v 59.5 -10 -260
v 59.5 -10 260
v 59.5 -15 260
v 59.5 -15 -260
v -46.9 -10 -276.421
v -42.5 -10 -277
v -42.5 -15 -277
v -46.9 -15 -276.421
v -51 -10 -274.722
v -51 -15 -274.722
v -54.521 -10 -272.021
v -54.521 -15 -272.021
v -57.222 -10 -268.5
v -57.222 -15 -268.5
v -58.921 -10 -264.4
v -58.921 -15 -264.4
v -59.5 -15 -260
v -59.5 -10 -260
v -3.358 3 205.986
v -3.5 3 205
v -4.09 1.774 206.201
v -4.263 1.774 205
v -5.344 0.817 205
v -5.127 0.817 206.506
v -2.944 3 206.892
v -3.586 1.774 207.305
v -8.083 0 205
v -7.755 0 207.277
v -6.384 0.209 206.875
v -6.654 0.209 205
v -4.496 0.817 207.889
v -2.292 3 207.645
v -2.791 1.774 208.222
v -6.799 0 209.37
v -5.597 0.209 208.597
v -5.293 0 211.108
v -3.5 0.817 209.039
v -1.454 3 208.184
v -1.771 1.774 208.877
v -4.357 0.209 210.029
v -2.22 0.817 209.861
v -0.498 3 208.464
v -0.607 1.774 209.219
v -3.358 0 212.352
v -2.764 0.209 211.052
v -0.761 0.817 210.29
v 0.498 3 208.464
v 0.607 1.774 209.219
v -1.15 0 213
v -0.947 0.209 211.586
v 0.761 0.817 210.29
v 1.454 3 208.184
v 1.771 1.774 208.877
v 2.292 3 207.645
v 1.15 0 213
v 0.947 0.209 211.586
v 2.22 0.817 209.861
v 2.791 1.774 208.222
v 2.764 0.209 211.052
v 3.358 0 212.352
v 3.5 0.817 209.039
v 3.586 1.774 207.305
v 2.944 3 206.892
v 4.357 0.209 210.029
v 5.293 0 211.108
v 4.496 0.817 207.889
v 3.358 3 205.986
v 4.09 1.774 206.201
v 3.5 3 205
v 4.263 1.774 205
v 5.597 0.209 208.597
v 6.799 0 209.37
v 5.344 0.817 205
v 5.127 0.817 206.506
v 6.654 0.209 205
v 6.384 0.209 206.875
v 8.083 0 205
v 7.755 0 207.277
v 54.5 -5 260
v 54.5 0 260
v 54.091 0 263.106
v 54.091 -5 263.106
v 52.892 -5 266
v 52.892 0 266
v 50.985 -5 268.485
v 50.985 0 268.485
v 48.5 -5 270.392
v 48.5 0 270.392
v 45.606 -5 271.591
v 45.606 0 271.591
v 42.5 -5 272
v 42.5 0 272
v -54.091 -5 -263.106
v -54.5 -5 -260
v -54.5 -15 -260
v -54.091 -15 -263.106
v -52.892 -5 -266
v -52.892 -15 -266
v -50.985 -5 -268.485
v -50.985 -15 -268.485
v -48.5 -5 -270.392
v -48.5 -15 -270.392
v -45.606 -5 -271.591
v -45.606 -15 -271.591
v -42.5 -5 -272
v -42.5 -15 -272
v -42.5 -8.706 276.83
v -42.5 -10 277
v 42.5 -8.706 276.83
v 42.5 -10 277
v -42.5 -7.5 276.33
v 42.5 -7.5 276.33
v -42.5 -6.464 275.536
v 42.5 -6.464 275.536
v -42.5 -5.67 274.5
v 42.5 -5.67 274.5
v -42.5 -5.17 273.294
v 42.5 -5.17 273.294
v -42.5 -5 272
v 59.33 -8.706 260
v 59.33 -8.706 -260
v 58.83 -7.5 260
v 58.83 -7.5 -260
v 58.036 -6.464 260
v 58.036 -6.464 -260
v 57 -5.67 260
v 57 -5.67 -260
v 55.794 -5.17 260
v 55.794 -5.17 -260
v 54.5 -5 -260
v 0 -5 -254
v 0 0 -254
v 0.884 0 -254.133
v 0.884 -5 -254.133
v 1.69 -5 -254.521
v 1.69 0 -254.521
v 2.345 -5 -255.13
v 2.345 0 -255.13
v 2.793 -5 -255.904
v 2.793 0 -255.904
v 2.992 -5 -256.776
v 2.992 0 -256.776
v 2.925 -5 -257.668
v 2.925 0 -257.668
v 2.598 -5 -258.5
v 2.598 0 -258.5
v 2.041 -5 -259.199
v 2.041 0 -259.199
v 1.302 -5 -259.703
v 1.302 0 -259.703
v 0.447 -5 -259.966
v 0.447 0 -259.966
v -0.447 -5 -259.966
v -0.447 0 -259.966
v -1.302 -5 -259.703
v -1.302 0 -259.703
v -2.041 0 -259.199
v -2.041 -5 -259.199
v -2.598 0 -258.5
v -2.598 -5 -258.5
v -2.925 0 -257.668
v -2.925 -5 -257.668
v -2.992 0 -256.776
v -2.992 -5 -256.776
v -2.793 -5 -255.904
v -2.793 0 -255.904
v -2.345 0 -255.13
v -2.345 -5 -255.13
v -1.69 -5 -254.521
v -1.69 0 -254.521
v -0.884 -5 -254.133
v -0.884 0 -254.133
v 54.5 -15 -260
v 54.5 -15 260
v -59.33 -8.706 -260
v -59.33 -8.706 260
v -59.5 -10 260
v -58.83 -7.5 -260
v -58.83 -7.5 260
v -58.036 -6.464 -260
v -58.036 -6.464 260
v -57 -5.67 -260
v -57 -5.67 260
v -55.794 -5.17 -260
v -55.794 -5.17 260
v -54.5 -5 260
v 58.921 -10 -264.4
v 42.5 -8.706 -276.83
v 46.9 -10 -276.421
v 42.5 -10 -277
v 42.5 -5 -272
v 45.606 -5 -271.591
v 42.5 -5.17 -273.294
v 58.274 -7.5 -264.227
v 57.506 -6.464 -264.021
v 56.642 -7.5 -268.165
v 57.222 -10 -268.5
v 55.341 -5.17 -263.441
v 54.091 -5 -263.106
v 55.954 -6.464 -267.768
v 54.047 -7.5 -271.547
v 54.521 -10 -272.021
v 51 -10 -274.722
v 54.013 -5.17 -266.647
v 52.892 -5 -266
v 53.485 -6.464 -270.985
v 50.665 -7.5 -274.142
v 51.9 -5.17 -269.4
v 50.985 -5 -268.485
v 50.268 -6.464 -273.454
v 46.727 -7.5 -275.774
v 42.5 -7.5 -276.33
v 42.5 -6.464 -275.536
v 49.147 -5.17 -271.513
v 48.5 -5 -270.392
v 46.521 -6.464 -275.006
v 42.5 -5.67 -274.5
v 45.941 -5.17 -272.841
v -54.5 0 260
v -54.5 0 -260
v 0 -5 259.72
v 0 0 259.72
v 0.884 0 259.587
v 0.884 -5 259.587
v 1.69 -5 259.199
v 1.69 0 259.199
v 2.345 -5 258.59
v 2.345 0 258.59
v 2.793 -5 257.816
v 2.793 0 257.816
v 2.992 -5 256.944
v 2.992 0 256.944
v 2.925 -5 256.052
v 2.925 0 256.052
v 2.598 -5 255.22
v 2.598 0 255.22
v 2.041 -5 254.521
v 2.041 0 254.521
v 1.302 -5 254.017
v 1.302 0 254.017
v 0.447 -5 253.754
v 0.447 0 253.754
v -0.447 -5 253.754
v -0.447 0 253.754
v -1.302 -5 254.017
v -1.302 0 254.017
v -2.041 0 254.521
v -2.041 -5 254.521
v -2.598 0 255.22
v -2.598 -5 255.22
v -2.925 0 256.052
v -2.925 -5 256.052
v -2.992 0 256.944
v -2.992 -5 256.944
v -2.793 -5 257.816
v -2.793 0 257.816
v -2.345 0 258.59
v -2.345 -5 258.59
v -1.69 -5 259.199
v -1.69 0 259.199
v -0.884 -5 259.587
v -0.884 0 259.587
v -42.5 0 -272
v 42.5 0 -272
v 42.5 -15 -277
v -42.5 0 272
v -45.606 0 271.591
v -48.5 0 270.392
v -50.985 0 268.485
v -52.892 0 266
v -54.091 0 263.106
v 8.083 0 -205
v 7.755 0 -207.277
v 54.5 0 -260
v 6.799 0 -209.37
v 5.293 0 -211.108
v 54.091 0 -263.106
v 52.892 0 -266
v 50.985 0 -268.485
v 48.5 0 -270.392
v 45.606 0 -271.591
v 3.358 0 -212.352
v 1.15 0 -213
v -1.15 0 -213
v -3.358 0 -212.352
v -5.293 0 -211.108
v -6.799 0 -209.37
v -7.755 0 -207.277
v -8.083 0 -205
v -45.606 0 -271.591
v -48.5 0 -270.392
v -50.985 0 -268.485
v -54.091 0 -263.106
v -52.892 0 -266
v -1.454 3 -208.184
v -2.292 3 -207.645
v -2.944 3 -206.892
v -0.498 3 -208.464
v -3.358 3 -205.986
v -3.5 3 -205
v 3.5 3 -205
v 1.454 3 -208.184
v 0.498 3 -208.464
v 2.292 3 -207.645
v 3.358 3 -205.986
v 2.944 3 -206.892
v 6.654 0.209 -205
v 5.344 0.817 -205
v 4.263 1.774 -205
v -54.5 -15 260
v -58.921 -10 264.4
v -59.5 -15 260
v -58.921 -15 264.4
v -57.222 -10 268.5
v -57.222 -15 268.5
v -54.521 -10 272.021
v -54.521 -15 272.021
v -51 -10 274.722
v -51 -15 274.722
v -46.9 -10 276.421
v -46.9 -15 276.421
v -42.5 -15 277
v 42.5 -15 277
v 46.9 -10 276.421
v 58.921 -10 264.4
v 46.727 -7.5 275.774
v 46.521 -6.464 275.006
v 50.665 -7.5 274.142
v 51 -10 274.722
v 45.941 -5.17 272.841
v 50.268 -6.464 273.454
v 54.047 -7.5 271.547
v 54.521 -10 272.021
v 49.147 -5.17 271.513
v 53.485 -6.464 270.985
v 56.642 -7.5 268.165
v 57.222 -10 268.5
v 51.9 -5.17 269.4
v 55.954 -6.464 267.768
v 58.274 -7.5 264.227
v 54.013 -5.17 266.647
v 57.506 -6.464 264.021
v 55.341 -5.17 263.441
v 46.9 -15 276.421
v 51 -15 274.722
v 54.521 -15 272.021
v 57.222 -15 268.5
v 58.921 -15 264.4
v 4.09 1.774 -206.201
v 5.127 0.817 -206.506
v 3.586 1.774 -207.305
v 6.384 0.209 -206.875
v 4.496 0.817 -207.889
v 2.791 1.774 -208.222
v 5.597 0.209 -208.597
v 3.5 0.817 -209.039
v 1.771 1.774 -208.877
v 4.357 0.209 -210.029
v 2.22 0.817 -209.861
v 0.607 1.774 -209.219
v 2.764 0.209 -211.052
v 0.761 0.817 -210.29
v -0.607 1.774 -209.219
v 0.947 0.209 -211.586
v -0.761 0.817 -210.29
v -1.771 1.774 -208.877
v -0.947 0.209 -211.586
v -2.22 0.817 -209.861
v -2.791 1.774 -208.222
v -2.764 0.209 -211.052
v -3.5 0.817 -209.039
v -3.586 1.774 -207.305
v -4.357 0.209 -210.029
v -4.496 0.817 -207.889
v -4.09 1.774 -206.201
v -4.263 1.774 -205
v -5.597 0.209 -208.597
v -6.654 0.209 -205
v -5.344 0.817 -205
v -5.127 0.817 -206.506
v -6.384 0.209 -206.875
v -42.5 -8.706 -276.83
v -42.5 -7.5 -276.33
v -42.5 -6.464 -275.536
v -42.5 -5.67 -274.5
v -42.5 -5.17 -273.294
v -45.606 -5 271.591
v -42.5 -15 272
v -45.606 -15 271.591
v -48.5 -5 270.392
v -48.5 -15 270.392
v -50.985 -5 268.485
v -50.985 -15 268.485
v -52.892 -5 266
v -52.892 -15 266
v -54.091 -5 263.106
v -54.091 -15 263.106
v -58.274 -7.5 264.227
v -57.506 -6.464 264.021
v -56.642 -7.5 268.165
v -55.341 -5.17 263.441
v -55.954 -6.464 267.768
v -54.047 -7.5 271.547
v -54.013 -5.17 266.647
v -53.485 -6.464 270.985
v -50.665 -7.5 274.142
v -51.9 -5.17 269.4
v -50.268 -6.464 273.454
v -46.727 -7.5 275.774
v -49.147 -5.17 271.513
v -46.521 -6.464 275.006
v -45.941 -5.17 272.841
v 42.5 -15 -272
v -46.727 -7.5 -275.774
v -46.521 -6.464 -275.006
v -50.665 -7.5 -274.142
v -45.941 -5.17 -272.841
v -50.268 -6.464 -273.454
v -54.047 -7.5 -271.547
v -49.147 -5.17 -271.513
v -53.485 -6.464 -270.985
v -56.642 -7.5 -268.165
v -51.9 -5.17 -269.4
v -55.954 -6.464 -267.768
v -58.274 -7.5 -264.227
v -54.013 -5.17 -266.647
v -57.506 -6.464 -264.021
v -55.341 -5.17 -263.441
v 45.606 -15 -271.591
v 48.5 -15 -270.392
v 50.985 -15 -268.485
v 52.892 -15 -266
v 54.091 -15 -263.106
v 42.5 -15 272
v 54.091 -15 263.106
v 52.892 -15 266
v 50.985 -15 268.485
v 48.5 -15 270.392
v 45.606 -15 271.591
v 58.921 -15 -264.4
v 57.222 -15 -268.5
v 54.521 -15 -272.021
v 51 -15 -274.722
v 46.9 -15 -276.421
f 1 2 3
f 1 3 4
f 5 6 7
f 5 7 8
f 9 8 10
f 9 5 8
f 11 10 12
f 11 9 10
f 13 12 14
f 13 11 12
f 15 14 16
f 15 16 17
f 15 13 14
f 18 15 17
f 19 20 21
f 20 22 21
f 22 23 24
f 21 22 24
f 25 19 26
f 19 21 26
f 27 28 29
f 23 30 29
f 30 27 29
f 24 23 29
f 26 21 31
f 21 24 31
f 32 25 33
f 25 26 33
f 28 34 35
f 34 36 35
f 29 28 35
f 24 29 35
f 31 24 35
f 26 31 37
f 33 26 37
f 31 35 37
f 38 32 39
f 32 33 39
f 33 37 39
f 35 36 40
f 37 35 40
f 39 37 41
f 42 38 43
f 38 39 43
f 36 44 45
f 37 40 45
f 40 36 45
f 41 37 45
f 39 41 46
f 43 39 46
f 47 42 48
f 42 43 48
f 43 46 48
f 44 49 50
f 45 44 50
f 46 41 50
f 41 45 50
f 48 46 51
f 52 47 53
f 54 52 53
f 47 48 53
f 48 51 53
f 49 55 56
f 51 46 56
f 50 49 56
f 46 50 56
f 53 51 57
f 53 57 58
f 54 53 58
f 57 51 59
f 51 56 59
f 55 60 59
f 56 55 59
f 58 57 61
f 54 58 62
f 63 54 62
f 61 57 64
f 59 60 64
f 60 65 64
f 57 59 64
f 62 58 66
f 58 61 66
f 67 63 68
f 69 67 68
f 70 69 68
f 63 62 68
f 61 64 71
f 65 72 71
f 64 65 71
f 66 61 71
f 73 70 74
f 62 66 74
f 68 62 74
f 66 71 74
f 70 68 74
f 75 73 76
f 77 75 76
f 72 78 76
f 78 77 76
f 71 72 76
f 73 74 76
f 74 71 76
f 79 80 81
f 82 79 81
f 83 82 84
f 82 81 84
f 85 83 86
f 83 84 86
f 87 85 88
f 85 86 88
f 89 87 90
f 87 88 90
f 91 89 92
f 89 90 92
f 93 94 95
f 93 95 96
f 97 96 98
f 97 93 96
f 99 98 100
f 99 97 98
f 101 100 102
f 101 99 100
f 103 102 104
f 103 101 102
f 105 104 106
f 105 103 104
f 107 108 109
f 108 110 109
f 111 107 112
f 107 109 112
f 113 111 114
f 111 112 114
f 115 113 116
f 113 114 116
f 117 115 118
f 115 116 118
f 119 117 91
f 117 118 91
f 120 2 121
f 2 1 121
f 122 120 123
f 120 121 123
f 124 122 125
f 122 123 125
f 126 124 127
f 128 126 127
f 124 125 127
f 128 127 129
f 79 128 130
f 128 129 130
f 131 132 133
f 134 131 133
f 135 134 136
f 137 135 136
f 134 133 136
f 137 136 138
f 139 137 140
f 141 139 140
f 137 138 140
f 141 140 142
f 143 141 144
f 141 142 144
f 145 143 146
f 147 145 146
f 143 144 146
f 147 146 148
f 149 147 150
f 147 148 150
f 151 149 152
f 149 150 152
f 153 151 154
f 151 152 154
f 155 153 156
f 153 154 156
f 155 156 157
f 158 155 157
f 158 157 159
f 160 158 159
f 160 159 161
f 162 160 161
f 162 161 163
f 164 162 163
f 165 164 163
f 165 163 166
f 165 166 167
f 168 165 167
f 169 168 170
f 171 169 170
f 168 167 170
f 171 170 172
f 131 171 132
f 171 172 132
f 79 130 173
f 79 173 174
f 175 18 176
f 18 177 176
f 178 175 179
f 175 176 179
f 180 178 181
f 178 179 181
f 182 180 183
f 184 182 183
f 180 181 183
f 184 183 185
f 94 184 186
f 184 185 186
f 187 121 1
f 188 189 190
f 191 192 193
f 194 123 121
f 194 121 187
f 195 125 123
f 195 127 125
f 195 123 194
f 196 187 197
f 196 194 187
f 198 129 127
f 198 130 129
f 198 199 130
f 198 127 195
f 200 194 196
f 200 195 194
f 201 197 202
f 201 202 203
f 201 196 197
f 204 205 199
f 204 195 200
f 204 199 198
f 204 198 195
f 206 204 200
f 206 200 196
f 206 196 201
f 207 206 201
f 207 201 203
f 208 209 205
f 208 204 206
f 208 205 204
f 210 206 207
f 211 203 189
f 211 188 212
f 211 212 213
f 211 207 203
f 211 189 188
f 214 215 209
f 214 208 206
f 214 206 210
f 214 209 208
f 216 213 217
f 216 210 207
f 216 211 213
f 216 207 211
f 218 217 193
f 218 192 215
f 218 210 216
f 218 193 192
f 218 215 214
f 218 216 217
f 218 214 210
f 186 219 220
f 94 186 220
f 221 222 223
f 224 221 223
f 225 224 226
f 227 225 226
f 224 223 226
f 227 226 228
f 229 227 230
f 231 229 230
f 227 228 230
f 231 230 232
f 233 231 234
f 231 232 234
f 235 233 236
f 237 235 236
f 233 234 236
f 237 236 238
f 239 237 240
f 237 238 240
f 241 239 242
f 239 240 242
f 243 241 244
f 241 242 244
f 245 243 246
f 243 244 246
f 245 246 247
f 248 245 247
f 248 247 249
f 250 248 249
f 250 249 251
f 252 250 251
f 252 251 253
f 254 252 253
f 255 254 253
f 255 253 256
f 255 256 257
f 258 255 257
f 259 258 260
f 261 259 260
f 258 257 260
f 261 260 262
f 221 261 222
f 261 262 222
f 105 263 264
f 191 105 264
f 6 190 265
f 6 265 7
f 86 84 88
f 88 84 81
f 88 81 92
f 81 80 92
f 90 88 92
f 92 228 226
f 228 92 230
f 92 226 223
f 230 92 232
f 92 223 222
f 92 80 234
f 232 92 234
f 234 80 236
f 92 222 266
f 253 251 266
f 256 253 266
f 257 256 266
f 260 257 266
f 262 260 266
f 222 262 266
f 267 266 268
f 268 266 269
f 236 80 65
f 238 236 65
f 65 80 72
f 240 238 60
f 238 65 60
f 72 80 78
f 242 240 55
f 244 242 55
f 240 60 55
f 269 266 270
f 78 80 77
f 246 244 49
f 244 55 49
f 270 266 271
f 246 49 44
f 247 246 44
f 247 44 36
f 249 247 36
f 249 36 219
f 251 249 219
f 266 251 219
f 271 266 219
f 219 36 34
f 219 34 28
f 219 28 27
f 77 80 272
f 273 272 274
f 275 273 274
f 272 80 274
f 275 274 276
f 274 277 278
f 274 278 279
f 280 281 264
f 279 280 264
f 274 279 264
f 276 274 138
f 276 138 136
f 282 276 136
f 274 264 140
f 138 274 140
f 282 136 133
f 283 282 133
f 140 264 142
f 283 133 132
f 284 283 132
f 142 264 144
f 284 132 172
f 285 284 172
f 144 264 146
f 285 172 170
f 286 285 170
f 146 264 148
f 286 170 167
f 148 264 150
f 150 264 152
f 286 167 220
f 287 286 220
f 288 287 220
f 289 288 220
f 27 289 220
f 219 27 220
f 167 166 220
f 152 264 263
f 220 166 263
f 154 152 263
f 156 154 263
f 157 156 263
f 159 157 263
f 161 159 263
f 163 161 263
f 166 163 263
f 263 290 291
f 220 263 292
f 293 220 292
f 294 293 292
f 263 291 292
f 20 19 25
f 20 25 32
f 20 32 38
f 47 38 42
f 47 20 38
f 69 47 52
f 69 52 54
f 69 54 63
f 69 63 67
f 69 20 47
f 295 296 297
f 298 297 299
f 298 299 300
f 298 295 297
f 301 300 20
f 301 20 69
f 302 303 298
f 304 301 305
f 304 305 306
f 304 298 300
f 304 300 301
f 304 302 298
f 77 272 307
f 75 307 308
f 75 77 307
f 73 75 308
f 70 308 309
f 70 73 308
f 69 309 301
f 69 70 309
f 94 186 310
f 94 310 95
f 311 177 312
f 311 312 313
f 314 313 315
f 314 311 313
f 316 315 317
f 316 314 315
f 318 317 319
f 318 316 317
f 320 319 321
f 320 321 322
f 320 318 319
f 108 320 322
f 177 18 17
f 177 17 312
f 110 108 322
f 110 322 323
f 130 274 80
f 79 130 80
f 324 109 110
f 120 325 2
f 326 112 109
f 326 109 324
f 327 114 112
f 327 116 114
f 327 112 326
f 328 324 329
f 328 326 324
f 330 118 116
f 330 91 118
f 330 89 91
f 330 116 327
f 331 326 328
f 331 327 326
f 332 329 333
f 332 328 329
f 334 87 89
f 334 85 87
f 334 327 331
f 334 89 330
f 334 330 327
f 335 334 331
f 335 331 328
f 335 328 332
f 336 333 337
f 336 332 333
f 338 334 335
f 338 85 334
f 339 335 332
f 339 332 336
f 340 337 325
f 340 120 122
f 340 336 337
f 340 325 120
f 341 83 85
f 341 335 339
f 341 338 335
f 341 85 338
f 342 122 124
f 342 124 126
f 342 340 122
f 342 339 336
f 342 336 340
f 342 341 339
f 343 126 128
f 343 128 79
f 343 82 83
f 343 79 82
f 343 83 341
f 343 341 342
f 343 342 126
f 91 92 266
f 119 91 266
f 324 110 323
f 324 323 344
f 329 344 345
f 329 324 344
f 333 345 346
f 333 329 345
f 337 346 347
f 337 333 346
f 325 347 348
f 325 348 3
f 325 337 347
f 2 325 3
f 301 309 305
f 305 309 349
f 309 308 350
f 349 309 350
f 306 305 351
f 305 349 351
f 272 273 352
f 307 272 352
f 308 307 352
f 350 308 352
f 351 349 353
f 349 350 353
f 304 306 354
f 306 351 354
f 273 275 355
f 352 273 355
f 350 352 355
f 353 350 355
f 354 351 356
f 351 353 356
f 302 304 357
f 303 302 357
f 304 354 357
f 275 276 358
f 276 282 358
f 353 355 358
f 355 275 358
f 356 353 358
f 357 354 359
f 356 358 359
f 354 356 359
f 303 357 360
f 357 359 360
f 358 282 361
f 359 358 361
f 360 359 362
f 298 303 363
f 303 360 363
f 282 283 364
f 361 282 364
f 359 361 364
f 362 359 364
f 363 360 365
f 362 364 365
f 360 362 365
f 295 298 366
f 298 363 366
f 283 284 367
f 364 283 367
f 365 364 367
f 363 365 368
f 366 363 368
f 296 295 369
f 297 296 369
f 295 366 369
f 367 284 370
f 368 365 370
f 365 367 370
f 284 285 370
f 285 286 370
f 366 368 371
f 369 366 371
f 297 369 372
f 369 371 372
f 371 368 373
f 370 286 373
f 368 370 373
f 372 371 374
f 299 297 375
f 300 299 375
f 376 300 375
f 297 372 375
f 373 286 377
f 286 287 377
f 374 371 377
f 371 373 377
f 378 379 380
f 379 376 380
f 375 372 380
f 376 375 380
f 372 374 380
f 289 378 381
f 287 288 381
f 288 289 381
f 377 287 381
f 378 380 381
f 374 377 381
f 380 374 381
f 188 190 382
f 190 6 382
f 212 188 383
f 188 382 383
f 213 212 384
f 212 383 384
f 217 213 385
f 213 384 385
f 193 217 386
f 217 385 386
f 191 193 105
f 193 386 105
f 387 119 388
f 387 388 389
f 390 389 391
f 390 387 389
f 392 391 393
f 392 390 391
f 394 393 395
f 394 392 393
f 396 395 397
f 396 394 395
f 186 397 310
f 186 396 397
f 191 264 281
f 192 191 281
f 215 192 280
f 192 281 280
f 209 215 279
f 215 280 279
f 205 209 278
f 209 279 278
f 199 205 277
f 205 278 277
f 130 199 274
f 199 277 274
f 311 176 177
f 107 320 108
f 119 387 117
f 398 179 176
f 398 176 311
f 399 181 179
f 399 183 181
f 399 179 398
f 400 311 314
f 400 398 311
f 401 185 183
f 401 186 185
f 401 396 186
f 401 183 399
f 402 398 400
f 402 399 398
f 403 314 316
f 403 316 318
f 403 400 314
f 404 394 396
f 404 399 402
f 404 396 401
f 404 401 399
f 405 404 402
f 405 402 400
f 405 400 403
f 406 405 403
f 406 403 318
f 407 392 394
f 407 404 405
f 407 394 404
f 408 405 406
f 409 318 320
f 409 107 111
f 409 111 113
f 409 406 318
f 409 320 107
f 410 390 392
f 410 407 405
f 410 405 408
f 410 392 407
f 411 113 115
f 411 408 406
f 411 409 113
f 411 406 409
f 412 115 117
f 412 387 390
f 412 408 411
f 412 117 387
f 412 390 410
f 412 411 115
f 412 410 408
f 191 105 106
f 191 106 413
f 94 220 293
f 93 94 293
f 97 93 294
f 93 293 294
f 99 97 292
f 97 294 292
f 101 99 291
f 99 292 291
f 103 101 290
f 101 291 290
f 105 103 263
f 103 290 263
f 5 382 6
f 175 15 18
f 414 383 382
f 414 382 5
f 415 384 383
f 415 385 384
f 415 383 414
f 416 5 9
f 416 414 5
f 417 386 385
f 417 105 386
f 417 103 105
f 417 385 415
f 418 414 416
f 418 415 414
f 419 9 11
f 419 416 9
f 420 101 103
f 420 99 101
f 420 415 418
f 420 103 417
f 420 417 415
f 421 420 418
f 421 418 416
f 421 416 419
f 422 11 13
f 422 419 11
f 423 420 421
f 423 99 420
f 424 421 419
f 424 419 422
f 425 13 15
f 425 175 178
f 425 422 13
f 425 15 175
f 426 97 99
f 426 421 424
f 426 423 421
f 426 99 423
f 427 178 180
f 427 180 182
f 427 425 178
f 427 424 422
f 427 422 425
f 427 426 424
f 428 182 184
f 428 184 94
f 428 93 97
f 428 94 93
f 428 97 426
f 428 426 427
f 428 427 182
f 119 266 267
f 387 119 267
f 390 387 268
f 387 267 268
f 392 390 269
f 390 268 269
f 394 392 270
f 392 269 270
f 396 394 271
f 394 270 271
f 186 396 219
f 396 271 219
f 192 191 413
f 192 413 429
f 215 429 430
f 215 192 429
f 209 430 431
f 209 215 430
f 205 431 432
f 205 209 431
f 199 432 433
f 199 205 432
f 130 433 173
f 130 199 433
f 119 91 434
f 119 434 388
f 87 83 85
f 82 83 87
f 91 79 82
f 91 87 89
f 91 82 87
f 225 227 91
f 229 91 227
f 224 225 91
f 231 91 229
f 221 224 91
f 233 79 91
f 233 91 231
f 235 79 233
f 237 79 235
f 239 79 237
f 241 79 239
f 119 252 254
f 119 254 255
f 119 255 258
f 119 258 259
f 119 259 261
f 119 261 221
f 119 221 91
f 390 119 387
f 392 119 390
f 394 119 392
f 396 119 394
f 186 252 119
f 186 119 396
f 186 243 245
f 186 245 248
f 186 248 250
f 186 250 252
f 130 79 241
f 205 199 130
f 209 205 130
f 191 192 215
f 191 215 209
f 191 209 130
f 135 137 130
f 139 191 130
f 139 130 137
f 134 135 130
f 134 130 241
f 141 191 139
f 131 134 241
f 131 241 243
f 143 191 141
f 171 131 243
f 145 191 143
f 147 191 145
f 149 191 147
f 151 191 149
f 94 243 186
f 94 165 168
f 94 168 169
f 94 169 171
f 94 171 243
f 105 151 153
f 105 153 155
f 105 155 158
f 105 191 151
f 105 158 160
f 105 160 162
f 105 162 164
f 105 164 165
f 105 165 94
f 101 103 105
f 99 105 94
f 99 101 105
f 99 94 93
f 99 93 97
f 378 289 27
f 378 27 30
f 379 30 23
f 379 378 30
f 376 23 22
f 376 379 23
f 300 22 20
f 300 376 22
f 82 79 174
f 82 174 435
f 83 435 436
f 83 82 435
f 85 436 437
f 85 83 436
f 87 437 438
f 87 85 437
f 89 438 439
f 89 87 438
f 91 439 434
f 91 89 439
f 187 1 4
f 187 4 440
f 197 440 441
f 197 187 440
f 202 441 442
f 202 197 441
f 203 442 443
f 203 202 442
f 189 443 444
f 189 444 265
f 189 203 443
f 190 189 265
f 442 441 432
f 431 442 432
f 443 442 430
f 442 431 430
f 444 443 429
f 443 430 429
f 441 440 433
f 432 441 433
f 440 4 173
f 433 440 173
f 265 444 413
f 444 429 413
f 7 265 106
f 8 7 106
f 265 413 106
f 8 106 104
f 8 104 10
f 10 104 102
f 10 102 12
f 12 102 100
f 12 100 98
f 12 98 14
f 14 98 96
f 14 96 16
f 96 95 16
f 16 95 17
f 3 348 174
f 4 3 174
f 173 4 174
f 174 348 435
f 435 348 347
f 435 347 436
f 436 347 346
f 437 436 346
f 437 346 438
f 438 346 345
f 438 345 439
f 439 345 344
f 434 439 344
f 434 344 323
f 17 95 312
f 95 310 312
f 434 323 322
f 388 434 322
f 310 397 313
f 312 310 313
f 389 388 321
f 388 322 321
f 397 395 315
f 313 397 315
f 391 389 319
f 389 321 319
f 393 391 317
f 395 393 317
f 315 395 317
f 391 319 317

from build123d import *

# Parameters (mm, degrees)
SKETCH3_R           = 3
BOSS_EXTRUDE3_DEPTH = 5
BOSS_EXTRUDE4_DEPTH = 3
FILLET5_R           = 5
BOSS_EXTRUDE5_DEPTH = 10
FILLET7_R           = 5


# Some blends are built 0.0001 mm under size
with BuildPart() as part:
    # Sketch3 → Boss-Extrude3 (new body)
    with BuildSketch(Plane(origin=(0, 0, 0), x_dir=(1, 0, 0), z_dir=(0, 1, 0))):
        with BuildLine():
            Line((-42.5, 272), (42.5, 272))
            ThreePointArc((42.5, 272), (50.985281374, 268.485281374), (54.5, 260))
            Line((54.5, 260), (54.5, -260))
            ThreePointArc((54.5, -260), (50.985281374, -268.485281374), (42.5, -272))
            Line((42.5, -272), (-42.5, -272))
            ThreePointArc((-42.5, -272), (-50.985281374, -268.485281374), (-54.5, -260))
            Line((-54.5, -260), (-54.5, 260))
            ThreePointArc((-54.5, 260), (-50.985281374, 268.485281374), (-42.5, 272))
        make_face()
        with Locations(Location((0, 257, 0), (0, 0, 270))):
            Circle(SKETCH3_R, mode=Mode.SUBTRACT)
        with Locations(Location((0, -256.72, 0), (0, 0, 270))):
            Circle(SKETCH3_R, mode=Mode.SUBTRACT)
    extrude(amount=-BOSS_EXTRUDE3_DEPTH)

    # Sketch4 → Boss-Extrude4 (add)
    with BuildSketch(Plane(origin=(0, 0, 0), x_dir=(1, 0, 0), z_dir=(0, 1, 0))):
        with BuildLine():
            Line((-3.5, 205), (-3.5, -205))
            ThreePointArc((-3.5, -205), (0, -208.5), (3.5, -205))
            Line((3.5, -205), (3.5, 205))
            ThreePointArc((3.5, 205), (0, 208.5), (-3.5, 205))
        make_face()
    extrude(amount=BOSS_EXTRUDE4_DEPTH)

    # Fillet5
    # the kernel refuses this fillet: 5 mm, written as the material it adds along each edge
    with BuildSketch(Plane(origin=(0, 0, 205), x_dir=(-1, 0, 0), z_dir=(0, 0, -1))) as fillet5_piece_1:
        with BuildLine():
            CenterArc((8.082575695, 5), FILLET5_R, 203.578178478, 66.421821522)
            Line((3.5, 3), (3.408348486, 2.96))
            ThreePointArc((3.408348486, 2.96), (3.4, 1.5), (3.4, 0))
            Line((3.4, 0), (3.5, -0.1))
            Line((3.5, -0.1), (8.082575695, -0.1))
            Line((8.082575695, -0.1), (8.082575695, 0))
        make_face()
    revolve(axis=Axis((0, 0, 205), (0, 1, 0)), revolution_arc=180)
    with BuildSketch(Plane(origin=(-3.5, 0, -205), x_dir=(-1, 0, 0), z_dir=(0, 0, 1)), Plane(origin=(3.5, 0, 205), x_dir=(1, 0, 0), z_dir=(0, 0, -1))) as fillet5_piece_2:
        with BuildLine():
            CenterArc((4.582575695, -5), FILLET5_R, 90, 66.421821522)
            Line((0, -3), (-0.091651514, -2.96))
            ThreePointArc((-0.091651514, -2.96), (-0.1, -1.5), (-0.1, 0))
            Line((-0.1, 0), (0, 0.1))
            Line((0, 0.1), (4.582575695, 0.1))
            Line((4.582575695, 0.1), (4.582575695, 0))
        make_face()
    extrude(amount=410)
    with BuildSketch(Plane(origin=(0, 0, -205), x_dir=(1, 0, 0), z_dir=(0, 0, 1))) as fillet5_piece_3:
        with BuildLine():
            CenterArc((8.082575695, 5), FILLET5_R, 203.578178478, 66.421821522)
            Line((3.5, 3), (3.408348486, 2.96))
            ThreePointArc((3.408348486, 2.96), (3.4, 1.5), (3.4, 0))
            Line((3.4, 0), (3.5, -0.1))
            Line((3.5, -0.1), (8.082575695, -0.1))
            Line((8.082575695, -0.1), (8.082575695, 0))
        make_face()
    revolve(axis=Axis((0, 0, -205), (0, 1, 0)), revolution_arc=180)


with BuildPart() as body_2:
    # Sketch5 → Boss-Extrude5 (new body)
    with BuildSketch(Plane.XZ.offset(5)):
        with BuildLine():
            Line((-42.5, 277), (42.5, 277))
            ThreePointArc((42.5, 277), (54.52081528, 272.02081528), (59.5, 260))
            Line((59.5, 260), (59.5, -260))
            ThreePointArc((59.5, -260), (54.52081528, -272.02081528), (42.5, -277))
            Line((42.5, -277), (-42.5, -277))
            ThreePointArc((-42.5, -277), (-54.52081528, -272.02081528), (-59.5, -260))
            Line((-59.5, -260), (-59.5, 260))
            ThreePointArc((-59.5, 260), (-54.52081528, 272.02081528), (-42.5, 277))
        make_face()
        with BuildLine():
            Line((-54.5, 260), (-54.5, -260))
            ThreePointArc((-54.5, -260), (-50.985281374, -268.485281374), (-42.5, -272))
            Line((-42.5, -272), (42.5, -272))
            ThreePointArc((42.5, -272), (50.985281374, -268.485281374), (54.5, -260))
            Line((54.5, -260), (54.5, 260))
            ThreePointArc((54.5, 260), (50.985281374, 268.485281374), (42.5, 272))
            Line((42.5, 272), (-42.5, 272))
            ThreePointArc((-42.5, 272), (-50.985281374, 268.485281374), (-54.5, 260))
        make_face(mode=Mode.SUBTRACT)
    extrude(amount=BOSS_EXTRUDE5_DEPTH)

    # Fillet7
    fillet7_edges = [body_2.edges().sort_by_distance(p)[0] for p in [
        (0, -5, -277),
        (-54.52081528, -5, -272.02081528),
        (-59.5, -5, 0),
        (-54.52081528, -5, 272.02081528),
        (0, -5, 277),
        (54.52081528, -5, 272.02081528),
        (59.5, -5, 0),
        (54.52081528, -5, -272.02081528),
    ]]
    fillet(fillet7_edges, radius=FILLET7_R - 0.0001)  # a hair under: the kernel refuses the full size


solid = Compound([part.part, body_2.part])
